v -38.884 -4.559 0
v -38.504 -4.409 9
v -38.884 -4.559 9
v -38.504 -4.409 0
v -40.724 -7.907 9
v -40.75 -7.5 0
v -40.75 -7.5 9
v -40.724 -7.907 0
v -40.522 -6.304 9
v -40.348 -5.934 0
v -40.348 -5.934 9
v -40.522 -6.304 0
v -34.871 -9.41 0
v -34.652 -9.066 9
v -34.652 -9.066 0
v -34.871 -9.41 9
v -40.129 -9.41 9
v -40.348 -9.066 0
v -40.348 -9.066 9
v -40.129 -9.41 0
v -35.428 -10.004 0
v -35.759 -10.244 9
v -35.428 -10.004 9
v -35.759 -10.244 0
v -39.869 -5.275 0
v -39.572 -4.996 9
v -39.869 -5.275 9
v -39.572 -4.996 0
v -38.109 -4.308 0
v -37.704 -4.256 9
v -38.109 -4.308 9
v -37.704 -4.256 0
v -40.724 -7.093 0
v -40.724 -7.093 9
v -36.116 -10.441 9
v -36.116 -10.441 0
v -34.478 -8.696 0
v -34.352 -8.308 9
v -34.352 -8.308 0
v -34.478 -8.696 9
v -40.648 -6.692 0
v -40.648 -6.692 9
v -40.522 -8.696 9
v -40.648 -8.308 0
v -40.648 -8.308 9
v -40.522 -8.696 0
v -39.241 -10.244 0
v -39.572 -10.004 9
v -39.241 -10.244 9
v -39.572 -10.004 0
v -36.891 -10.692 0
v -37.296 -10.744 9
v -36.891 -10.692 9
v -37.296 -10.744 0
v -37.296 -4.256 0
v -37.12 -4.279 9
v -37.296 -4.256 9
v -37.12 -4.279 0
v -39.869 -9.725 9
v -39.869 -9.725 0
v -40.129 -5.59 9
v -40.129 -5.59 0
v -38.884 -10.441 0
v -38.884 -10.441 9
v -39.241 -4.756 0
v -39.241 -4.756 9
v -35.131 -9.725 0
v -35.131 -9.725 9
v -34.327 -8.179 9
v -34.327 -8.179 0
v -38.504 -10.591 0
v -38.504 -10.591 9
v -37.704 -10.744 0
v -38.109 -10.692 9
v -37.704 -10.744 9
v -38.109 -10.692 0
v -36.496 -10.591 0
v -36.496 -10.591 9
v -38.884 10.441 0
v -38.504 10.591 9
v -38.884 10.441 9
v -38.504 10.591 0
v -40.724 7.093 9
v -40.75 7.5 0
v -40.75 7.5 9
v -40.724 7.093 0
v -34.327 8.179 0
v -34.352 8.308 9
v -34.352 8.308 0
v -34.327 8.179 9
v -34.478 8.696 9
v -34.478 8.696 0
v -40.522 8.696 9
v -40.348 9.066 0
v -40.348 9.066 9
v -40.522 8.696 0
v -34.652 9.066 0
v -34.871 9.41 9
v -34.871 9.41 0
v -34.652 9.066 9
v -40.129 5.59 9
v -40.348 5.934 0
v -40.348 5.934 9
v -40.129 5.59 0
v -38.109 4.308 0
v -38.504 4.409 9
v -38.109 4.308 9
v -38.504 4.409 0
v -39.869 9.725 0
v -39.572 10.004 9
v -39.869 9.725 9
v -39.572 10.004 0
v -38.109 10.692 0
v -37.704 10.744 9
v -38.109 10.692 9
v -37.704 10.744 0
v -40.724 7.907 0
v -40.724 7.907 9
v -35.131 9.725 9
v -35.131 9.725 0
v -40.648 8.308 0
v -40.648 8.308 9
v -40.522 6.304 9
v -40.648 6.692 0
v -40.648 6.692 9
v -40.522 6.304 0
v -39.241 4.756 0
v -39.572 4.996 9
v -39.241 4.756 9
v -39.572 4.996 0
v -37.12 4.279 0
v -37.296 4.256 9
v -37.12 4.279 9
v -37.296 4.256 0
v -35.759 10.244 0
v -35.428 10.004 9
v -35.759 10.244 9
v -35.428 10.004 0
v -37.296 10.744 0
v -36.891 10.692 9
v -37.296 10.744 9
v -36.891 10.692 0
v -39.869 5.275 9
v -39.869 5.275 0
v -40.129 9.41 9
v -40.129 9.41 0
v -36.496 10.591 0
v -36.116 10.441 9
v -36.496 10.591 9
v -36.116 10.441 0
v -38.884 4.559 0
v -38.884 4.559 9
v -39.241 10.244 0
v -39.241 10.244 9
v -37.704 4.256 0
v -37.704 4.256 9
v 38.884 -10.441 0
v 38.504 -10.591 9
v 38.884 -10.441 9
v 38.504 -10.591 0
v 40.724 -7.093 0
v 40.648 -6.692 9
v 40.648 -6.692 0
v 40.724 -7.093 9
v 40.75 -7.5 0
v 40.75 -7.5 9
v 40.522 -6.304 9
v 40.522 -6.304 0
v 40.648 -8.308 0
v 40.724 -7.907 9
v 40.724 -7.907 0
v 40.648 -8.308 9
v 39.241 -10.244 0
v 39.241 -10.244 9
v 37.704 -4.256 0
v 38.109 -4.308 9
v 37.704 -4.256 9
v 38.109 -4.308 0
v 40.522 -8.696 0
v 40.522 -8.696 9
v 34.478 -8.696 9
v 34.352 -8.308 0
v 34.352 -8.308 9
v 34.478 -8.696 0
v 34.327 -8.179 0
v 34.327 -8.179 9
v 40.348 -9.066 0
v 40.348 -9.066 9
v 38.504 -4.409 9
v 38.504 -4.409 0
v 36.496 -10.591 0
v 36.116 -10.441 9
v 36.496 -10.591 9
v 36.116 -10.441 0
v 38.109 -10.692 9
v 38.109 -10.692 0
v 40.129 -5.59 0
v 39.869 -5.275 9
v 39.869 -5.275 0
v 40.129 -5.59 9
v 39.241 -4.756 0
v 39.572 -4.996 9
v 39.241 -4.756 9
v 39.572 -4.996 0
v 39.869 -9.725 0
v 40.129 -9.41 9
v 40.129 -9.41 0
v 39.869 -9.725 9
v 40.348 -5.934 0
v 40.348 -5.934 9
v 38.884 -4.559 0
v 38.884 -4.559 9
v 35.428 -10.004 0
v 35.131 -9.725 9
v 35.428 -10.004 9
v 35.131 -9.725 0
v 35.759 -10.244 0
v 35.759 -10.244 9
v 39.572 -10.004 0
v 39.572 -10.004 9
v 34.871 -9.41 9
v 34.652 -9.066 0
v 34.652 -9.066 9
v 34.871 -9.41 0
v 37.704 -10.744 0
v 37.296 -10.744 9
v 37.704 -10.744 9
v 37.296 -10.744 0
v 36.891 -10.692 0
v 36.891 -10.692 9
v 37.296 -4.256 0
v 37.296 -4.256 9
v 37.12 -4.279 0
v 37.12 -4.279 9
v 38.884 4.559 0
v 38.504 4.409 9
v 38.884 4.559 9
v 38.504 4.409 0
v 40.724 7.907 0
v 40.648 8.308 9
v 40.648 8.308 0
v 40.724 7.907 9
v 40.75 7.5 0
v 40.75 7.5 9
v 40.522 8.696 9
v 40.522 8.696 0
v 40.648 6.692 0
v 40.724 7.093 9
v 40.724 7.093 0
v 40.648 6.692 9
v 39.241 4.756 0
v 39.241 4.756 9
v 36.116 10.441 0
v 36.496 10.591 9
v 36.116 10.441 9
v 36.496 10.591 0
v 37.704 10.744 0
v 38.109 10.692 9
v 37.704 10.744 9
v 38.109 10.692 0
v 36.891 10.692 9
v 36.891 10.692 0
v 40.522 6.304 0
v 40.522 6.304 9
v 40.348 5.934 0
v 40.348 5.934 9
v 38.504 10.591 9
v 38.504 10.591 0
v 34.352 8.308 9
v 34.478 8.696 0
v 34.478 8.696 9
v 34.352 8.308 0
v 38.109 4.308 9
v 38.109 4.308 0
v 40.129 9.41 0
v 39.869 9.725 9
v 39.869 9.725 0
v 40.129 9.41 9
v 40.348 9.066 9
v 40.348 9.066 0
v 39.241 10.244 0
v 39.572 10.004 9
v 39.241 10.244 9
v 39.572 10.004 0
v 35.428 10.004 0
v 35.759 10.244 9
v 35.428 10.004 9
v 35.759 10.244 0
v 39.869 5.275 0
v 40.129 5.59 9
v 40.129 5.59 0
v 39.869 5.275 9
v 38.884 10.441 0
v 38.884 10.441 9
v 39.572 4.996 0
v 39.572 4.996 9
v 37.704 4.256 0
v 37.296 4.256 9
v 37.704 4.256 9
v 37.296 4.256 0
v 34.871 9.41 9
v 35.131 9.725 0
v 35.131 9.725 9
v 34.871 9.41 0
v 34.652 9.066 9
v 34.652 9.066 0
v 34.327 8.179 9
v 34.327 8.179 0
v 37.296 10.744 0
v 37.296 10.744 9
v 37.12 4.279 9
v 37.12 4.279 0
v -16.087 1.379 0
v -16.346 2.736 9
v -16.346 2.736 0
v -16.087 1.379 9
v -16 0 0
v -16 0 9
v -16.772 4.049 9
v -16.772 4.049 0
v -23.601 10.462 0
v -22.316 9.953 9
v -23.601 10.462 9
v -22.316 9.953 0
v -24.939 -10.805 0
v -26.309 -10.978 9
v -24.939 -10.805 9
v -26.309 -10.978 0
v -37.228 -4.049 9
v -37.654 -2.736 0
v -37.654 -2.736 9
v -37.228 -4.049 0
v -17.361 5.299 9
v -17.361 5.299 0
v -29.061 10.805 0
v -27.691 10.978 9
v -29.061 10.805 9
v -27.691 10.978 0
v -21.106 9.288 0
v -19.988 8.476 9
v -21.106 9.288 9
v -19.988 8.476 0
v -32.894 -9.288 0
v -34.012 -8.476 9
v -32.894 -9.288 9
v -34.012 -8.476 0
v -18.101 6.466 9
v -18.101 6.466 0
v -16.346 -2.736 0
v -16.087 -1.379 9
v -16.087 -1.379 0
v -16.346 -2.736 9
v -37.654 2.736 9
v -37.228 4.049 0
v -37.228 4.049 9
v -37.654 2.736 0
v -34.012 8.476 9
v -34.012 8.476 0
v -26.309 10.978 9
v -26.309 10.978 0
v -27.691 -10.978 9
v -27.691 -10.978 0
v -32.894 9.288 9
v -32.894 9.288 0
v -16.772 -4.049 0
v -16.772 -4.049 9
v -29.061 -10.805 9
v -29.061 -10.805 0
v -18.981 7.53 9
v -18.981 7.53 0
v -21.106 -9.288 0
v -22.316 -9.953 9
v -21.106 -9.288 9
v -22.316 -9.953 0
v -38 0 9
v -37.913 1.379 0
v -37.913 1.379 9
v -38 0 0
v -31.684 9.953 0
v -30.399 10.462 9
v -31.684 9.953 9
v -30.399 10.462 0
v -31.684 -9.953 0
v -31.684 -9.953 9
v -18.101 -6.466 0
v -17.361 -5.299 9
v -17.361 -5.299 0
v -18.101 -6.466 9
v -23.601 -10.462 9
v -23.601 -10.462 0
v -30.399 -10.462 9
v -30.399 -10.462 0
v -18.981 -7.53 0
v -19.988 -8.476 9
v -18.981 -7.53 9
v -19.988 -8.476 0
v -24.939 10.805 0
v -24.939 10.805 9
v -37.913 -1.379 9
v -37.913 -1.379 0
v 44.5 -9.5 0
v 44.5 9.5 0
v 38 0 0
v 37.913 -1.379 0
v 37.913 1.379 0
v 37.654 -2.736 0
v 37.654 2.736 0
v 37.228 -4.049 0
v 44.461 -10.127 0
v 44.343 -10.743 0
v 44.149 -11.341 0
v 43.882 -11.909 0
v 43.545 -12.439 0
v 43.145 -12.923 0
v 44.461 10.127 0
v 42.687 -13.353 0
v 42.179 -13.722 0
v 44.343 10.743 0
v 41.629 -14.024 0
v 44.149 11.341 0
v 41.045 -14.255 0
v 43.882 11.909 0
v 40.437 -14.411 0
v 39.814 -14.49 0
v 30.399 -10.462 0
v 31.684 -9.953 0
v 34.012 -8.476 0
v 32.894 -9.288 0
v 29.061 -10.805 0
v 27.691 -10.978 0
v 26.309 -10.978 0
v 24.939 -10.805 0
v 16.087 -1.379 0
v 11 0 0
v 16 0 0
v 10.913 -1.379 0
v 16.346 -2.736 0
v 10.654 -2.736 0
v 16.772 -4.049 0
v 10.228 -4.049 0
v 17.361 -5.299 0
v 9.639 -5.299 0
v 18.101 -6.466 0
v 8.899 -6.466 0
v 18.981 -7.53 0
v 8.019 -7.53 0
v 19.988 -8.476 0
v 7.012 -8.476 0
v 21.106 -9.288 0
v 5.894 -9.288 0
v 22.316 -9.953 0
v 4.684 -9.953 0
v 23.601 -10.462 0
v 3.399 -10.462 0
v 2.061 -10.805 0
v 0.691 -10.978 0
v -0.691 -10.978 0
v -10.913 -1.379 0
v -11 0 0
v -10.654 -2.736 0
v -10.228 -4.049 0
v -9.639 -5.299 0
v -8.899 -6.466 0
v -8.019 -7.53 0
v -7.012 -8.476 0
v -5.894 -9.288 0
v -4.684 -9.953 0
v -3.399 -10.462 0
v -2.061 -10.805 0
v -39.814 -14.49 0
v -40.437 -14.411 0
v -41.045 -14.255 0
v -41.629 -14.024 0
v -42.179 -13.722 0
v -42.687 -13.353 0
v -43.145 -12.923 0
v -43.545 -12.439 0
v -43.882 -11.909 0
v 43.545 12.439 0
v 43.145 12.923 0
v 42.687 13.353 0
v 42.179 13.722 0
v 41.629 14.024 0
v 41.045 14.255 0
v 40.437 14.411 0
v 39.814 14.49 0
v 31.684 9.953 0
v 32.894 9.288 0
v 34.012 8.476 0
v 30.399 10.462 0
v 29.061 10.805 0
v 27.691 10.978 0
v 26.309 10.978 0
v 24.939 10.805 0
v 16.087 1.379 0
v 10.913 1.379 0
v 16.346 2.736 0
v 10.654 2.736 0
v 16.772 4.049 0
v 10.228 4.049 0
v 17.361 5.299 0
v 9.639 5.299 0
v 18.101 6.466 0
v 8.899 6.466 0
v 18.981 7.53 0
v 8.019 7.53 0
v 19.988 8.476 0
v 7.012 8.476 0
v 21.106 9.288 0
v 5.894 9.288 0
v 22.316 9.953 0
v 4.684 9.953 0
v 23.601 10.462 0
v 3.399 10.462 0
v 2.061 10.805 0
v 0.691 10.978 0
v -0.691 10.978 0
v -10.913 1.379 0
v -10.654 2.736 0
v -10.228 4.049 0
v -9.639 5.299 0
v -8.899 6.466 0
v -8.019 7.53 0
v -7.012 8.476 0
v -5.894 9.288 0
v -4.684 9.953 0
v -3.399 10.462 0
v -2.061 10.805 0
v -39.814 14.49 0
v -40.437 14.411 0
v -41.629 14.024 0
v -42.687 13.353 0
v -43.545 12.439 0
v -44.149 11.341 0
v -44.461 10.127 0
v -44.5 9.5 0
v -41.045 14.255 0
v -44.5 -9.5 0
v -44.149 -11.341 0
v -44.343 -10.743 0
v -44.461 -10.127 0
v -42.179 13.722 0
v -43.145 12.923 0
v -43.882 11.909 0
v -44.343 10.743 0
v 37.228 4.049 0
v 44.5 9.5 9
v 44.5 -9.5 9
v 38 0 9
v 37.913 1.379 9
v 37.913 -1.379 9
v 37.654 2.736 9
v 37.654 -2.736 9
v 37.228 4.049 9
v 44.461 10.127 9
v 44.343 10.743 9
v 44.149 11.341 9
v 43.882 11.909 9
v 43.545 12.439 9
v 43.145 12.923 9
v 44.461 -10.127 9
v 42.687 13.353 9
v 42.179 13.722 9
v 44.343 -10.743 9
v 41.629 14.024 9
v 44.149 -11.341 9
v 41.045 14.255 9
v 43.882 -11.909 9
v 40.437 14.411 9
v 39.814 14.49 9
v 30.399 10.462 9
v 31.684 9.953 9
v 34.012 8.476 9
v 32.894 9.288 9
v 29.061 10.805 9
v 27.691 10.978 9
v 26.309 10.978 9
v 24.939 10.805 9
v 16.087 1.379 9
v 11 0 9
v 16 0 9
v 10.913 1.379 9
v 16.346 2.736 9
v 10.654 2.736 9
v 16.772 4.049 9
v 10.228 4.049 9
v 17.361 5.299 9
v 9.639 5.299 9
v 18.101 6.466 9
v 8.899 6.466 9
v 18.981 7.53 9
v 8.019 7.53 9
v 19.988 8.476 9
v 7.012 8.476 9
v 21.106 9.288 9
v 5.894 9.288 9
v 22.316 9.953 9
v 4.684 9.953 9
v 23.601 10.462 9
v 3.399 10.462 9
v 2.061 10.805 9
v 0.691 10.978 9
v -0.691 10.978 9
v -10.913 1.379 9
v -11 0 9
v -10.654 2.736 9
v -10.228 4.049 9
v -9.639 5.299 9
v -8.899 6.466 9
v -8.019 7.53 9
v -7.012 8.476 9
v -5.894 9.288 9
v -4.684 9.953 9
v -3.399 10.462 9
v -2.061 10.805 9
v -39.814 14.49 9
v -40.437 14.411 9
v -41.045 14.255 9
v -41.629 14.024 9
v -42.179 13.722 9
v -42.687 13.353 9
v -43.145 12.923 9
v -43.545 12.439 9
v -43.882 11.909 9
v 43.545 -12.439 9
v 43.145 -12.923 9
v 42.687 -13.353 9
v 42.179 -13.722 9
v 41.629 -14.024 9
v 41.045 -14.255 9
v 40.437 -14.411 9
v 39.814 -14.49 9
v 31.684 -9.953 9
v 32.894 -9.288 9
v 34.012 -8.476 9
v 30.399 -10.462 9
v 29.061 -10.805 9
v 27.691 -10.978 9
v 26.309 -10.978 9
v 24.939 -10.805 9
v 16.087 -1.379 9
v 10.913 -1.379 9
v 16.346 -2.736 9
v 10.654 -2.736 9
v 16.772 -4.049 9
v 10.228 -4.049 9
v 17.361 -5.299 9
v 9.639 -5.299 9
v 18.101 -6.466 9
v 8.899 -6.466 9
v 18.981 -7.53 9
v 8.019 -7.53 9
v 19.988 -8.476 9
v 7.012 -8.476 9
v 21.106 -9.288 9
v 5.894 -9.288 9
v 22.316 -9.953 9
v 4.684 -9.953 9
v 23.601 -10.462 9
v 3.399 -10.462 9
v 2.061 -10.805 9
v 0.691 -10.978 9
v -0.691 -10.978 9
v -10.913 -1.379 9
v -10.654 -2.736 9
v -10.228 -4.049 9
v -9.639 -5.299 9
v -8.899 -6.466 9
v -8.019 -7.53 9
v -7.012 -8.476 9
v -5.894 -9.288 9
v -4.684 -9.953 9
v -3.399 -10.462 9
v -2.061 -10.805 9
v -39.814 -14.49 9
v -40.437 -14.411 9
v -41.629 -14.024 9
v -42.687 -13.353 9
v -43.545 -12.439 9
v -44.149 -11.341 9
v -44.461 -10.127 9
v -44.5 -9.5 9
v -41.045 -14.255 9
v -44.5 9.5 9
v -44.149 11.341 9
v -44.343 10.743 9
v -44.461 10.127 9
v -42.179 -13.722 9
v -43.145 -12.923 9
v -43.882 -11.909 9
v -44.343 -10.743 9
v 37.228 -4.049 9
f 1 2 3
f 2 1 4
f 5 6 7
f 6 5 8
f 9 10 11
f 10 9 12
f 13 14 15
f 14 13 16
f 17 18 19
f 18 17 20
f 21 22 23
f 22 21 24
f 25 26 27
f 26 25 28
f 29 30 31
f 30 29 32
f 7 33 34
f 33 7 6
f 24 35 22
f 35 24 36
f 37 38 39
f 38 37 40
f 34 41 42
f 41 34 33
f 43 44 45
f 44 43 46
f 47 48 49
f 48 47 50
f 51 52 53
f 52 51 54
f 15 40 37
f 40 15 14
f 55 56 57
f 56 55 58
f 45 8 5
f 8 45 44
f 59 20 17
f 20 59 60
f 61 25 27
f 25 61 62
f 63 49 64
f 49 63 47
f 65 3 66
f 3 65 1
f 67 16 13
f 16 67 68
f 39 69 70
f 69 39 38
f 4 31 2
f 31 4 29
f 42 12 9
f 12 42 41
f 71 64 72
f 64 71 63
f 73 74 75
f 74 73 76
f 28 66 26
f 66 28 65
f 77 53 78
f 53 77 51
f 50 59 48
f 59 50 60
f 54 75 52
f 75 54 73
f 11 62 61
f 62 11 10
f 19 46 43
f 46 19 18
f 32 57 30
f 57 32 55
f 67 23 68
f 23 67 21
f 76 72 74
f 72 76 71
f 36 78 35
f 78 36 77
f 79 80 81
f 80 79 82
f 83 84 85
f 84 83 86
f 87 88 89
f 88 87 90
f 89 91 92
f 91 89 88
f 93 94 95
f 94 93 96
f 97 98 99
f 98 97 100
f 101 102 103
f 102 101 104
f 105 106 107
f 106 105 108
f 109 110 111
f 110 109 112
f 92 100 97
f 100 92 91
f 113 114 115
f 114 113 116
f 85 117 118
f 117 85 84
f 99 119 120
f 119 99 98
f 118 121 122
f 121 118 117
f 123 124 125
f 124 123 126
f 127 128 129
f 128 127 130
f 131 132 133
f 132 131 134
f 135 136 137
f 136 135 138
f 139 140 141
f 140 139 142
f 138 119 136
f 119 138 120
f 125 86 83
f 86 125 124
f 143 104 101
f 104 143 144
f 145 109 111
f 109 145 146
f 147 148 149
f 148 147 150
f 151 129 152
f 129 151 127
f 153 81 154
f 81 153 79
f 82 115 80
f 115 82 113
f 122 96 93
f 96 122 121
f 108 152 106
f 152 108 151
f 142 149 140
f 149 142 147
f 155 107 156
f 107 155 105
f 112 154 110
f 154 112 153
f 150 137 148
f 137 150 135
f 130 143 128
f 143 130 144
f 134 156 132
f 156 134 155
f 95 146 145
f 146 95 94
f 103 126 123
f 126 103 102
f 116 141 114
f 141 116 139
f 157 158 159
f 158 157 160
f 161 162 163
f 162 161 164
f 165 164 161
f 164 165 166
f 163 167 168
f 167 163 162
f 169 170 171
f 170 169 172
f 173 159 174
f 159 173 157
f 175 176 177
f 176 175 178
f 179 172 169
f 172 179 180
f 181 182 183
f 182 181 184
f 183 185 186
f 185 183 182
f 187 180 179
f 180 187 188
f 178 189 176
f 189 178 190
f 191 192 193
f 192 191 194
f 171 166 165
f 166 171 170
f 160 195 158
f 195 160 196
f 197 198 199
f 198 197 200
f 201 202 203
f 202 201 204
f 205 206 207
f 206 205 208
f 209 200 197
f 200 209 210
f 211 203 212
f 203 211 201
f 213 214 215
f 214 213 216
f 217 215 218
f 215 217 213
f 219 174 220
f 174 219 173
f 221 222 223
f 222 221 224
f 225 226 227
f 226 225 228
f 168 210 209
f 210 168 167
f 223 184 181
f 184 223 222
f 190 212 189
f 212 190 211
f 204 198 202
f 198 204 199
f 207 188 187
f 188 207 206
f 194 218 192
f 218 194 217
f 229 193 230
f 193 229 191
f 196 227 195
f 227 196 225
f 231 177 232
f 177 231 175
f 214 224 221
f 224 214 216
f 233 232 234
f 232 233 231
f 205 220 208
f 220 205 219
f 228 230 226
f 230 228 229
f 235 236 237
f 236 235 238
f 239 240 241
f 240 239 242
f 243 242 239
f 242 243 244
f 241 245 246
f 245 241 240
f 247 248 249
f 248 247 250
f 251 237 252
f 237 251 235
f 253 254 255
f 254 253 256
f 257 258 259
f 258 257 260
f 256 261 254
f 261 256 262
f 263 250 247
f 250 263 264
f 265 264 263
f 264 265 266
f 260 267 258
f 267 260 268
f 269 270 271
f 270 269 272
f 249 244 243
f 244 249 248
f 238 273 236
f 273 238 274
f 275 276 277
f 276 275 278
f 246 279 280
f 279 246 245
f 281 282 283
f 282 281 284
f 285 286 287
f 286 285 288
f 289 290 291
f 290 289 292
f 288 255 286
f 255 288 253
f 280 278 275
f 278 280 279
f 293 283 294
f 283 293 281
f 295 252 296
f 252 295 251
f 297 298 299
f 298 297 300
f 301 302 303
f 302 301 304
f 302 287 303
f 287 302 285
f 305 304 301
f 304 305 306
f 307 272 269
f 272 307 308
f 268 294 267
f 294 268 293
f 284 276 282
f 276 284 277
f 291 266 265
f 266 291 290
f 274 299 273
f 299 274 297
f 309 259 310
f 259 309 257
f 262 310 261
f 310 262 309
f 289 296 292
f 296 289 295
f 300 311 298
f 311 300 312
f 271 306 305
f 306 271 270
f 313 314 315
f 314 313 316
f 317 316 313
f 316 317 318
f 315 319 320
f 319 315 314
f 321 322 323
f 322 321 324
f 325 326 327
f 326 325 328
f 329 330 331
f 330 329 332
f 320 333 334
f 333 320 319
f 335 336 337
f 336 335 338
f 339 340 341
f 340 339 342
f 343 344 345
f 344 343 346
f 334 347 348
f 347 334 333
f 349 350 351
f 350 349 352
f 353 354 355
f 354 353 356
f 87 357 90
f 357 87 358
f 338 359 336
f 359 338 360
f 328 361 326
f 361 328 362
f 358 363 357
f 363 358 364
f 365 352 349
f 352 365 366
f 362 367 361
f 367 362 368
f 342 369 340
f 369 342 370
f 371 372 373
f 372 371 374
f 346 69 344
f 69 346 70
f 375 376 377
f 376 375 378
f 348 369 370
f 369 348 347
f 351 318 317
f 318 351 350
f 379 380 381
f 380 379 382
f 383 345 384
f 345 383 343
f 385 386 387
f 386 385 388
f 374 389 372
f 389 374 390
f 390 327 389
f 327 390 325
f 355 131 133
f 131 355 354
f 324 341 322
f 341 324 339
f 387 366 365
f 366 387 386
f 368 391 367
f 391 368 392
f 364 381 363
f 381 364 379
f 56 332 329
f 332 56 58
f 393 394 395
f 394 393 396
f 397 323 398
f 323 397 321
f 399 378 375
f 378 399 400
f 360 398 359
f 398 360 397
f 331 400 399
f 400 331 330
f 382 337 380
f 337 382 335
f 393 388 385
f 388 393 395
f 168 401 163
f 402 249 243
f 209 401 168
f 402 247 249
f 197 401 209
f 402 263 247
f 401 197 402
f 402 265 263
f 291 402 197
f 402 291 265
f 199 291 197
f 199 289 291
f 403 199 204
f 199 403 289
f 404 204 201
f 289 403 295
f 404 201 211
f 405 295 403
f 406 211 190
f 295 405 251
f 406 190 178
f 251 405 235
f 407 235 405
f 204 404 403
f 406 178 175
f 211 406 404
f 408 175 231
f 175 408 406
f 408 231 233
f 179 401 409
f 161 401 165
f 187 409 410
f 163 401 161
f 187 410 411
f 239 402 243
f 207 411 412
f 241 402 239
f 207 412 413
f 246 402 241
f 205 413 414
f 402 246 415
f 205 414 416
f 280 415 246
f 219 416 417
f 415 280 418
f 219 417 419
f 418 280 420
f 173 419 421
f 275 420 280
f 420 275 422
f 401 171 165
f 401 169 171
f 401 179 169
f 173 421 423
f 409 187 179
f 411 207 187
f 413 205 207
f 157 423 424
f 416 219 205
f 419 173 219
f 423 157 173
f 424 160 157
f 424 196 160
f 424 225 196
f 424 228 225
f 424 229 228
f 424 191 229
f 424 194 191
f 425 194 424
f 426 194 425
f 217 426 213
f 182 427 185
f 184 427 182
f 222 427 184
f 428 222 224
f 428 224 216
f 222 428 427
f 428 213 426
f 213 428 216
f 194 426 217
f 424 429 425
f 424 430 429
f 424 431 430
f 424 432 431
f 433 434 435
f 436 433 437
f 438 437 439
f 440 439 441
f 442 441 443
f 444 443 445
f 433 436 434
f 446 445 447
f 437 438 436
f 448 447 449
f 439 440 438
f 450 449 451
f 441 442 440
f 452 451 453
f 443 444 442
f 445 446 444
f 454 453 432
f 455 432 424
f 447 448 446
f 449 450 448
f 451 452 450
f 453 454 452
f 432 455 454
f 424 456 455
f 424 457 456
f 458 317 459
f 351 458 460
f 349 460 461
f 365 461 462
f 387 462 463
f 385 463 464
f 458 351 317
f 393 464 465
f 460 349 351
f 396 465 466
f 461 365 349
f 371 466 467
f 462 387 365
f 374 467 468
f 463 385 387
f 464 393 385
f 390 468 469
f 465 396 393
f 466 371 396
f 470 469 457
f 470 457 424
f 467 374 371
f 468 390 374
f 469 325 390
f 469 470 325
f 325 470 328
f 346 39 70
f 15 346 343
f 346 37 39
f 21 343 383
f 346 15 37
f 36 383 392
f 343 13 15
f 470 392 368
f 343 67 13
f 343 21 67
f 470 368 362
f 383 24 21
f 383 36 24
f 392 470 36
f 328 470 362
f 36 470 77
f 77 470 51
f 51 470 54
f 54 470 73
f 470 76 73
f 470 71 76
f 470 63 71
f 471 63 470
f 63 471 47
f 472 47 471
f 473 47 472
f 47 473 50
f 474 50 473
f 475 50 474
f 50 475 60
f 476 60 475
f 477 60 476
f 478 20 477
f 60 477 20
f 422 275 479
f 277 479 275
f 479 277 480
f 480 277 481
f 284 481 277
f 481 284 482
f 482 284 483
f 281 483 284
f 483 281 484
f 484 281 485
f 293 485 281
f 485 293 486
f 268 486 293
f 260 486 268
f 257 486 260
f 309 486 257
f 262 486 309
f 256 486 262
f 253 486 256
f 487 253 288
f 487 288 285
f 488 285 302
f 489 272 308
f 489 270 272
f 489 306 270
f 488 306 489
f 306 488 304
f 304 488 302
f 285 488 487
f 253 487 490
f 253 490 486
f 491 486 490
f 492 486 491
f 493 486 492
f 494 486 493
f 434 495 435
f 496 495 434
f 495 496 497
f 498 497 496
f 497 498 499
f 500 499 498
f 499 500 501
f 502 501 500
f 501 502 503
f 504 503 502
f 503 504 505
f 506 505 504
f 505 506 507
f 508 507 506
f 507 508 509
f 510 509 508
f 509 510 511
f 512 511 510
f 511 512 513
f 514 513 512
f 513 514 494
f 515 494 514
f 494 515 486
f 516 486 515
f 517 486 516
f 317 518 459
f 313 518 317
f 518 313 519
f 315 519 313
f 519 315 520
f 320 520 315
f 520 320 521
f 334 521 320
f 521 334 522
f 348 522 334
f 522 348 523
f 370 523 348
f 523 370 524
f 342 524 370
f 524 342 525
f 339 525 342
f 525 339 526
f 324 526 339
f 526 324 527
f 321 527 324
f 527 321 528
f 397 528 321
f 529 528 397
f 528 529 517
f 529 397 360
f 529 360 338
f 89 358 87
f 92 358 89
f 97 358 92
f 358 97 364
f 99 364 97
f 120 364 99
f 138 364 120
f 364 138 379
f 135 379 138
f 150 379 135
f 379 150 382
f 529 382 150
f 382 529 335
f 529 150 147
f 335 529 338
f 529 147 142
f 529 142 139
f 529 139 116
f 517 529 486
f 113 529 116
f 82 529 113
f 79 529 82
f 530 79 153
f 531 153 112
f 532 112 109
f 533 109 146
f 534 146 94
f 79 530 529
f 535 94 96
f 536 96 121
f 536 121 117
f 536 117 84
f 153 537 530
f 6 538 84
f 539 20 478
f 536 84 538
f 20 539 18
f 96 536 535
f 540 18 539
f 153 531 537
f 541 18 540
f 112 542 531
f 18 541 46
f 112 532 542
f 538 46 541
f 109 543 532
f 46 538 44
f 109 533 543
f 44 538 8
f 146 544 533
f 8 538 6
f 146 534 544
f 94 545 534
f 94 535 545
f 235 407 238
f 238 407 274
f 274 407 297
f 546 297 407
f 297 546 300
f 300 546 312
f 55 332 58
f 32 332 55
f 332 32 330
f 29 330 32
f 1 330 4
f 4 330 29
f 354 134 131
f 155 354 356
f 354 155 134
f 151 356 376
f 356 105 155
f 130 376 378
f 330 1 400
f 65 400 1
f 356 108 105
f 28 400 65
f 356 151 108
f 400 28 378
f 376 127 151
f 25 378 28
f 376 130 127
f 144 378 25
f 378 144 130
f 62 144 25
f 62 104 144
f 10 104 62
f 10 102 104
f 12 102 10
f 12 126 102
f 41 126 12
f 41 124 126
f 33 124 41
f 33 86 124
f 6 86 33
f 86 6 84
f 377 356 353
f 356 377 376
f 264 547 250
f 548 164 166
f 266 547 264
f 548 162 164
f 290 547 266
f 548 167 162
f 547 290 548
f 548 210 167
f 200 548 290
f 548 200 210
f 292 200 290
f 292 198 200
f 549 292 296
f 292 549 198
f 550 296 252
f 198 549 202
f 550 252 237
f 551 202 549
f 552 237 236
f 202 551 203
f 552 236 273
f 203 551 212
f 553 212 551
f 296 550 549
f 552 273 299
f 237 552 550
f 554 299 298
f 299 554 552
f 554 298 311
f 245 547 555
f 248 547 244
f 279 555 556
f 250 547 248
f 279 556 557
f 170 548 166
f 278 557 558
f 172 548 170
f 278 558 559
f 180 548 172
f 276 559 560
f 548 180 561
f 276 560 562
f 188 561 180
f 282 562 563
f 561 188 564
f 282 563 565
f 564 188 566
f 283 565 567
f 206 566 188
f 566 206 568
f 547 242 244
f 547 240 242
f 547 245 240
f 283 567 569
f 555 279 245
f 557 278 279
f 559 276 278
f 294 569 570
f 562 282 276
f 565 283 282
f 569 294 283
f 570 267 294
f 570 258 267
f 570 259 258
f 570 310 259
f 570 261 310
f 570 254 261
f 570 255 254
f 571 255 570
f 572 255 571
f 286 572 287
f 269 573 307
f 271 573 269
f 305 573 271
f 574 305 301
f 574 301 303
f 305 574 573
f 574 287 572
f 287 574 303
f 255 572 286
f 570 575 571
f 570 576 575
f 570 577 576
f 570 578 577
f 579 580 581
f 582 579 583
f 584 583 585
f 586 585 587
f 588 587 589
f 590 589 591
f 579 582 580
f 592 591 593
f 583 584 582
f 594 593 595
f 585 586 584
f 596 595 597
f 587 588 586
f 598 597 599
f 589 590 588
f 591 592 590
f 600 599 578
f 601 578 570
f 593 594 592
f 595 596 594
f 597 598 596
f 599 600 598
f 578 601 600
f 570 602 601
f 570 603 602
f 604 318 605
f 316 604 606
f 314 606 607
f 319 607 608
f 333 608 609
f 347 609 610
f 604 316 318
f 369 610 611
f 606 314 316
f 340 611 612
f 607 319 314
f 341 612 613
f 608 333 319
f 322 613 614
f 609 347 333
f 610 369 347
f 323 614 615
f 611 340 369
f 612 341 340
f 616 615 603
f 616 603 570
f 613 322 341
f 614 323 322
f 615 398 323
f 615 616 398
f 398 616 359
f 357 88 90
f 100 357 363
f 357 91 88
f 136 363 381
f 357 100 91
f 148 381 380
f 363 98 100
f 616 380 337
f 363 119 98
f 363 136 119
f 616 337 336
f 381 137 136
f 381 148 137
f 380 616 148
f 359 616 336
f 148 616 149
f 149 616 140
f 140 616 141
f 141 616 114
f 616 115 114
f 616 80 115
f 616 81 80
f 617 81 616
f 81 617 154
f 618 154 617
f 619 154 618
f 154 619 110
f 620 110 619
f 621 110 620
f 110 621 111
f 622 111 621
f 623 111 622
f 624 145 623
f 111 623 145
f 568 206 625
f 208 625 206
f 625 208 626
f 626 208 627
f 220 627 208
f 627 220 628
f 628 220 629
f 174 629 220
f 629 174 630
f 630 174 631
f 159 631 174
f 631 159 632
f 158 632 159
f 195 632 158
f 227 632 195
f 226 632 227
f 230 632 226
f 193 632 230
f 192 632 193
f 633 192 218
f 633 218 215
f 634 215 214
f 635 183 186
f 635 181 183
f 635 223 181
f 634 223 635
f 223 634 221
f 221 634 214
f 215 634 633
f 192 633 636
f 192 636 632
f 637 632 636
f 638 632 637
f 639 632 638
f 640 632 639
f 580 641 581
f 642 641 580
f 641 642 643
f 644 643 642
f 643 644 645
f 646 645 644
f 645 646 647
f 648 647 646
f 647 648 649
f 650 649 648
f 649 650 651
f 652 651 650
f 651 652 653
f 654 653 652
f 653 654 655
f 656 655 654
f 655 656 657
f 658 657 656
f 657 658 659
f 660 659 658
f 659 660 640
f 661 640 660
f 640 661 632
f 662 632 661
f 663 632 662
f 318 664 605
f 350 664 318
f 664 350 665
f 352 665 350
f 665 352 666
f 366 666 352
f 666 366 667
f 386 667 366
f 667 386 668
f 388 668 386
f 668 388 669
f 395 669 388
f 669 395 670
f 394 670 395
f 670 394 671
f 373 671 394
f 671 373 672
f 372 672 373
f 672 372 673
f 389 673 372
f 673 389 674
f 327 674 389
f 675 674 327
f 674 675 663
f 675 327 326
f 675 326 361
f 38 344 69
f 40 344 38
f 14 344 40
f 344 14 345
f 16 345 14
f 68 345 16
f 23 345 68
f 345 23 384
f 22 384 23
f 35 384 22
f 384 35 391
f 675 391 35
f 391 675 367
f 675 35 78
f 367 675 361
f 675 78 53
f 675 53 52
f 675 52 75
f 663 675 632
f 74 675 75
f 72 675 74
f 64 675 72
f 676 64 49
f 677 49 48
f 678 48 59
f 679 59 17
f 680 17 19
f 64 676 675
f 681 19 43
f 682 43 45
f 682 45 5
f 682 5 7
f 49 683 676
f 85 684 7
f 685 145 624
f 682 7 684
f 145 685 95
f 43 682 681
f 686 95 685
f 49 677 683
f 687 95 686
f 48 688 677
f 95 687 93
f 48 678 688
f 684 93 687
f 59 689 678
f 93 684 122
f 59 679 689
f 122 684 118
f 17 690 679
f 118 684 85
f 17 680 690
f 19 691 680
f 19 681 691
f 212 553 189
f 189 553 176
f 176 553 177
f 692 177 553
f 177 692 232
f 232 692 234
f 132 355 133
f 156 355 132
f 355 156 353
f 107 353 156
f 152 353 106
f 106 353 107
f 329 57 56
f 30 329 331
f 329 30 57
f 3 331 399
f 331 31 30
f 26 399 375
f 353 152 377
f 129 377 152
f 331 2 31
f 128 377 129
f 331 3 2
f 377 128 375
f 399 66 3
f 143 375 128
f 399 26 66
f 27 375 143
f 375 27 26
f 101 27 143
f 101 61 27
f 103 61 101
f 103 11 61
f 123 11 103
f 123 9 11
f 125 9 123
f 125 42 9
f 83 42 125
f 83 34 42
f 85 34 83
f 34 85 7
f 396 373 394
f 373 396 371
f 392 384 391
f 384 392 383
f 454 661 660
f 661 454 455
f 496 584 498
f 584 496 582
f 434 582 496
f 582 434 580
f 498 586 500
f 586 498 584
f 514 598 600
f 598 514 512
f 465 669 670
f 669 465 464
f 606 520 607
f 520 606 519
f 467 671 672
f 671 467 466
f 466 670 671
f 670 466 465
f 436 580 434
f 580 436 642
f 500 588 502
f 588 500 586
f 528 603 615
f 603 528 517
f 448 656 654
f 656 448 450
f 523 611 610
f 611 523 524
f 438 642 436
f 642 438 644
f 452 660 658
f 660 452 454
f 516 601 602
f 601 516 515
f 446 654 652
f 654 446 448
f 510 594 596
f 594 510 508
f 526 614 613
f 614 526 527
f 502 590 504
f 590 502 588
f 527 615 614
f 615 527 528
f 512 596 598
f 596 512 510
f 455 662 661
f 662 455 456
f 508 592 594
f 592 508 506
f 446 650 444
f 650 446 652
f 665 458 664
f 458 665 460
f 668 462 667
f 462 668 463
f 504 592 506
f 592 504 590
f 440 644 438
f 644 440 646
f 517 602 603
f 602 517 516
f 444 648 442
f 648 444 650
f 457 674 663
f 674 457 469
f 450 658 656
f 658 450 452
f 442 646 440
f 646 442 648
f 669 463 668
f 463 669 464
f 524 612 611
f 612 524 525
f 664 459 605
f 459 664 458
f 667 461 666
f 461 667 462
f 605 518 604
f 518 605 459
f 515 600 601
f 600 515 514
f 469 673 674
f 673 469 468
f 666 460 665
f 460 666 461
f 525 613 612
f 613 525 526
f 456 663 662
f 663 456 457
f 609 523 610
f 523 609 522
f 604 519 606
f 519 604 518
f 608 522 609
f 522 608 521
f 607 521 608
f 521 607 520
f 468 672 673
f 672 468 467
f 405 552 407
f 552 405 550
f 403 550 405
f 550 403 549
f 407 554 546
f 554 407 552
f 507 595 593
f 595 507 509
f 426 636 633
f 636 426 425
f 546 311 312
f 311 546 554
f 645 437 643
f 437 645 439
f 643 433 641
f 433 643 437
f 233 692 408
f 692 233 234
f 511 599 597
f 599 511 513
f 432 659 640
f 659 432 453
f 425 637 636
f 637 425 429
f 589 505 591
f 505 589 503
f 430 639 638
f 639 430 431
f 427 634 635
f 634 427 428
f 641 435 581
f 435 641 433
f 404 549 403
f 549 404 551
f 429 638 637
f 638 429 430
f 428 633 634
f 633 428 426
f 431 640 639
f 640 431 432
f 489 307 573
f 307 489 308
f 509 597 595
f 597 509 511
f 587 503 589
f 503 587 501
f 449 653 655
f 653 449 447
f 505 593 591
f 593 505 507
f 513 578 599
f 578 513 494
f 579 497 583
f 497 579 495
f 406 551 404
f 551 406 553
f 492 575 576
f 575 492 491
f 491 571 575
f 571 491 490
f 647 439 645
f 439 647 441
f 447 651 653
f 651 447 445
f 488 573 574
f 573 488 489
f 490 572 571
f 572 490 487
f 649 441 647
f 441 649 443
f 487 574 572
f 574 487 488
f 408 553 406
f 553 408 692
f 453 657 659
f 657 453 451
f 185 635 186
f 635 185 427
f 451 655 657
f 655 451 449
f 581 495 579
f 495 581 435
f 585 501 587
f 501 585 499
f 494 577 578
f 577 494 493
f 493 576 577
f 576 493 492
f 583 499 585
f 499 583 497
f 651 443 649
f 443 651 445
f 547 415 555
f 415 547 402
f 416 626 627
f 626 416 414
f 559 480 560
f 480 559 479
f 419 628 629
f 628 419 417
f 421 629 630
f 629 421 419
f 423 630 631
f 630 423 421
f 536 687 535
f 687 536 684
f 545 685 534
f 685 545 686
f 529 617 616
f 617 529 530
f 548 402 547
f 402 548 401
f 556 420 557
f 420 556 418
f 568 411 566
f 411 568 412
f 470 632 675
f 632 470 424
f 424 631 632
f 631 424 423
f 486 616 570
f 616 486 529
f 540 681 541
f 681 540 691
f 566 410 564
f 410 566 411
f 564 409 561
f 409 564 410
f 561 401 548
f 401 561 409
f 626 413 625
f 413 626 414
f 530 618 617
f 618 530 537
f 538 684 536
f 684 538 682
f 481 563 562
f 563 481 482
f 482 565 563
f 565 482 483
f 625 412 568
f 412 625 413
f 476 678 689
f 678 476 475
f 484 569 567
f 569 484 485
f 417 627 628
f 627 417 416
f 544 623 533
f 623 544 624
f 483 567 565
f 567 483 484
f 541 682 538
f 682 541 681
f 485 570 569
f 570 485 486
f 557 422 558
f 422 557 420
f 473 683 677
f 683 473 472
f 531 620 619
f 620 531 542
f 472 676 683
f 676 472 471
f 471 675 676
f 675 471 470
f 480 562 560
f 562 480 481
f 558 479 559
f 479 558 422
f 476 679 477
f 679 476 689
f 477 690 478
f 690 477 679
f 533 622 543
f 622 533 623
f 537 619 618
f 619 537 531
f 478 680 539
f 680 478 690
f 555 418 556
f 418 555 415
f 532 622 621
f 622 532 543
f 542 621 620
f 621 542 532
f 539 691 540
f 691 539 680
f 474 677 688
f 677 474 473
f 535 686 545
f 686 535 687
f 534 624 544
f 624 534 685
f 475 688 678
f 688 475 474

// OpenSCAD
$fn = 50;


difference() {
	union() {
		hull() {
			translate(v = [-39.5000000000, 9.5000000000, 0]) {
				cylinder(h = 9, r = 5);
			}
			translate(v = [39.5000000000, 9.5000000000, 0]) {
				cylinder(h = 9, r = 5);
			}
			translate(v = [-39.5000000000, -9.5000000000, 0]) {
				cylinder(h = 9, r = 5);
			}
			translate(v = [39.5000000000, -9.5000000000, 0]) {
				cylinder(h = 9, r = 5);
			}
		}
	}
	union() {
		#translate(v = [-37.5000000000, -7.5000000000, -100.0000000000]) {
			cylinder(h = 200, r = 3.2500000000);
		}
		#translate(v = [-37.5000000000, 7.5000000000, -100.0000000000]) {
			cylinder(h = 200, r = 3.2500000000);
		}
		#translate(v = [37.5000000000, -7.5000000000, -100.0000000000]) {
			cylinder(h = 200, r = 3.2500000000);
		}
		#translate(v = [37.5000000000, 7.5000000000, -100.0000000000]) {
			cylinder(h = 200, r = 3.2500000000);
		}
		#translate(v = [-27.0000000000, 0, 0]) {
			cylinder(h = 9, r = 11.0000000000);
		}
		#cylinder(h = 9, r = 11.0000000000);
		#translate(v = [27.0000000000, 0, 0]) {
			cylinder(h = 9, r = 11.0000000000);
		}
	}
}
